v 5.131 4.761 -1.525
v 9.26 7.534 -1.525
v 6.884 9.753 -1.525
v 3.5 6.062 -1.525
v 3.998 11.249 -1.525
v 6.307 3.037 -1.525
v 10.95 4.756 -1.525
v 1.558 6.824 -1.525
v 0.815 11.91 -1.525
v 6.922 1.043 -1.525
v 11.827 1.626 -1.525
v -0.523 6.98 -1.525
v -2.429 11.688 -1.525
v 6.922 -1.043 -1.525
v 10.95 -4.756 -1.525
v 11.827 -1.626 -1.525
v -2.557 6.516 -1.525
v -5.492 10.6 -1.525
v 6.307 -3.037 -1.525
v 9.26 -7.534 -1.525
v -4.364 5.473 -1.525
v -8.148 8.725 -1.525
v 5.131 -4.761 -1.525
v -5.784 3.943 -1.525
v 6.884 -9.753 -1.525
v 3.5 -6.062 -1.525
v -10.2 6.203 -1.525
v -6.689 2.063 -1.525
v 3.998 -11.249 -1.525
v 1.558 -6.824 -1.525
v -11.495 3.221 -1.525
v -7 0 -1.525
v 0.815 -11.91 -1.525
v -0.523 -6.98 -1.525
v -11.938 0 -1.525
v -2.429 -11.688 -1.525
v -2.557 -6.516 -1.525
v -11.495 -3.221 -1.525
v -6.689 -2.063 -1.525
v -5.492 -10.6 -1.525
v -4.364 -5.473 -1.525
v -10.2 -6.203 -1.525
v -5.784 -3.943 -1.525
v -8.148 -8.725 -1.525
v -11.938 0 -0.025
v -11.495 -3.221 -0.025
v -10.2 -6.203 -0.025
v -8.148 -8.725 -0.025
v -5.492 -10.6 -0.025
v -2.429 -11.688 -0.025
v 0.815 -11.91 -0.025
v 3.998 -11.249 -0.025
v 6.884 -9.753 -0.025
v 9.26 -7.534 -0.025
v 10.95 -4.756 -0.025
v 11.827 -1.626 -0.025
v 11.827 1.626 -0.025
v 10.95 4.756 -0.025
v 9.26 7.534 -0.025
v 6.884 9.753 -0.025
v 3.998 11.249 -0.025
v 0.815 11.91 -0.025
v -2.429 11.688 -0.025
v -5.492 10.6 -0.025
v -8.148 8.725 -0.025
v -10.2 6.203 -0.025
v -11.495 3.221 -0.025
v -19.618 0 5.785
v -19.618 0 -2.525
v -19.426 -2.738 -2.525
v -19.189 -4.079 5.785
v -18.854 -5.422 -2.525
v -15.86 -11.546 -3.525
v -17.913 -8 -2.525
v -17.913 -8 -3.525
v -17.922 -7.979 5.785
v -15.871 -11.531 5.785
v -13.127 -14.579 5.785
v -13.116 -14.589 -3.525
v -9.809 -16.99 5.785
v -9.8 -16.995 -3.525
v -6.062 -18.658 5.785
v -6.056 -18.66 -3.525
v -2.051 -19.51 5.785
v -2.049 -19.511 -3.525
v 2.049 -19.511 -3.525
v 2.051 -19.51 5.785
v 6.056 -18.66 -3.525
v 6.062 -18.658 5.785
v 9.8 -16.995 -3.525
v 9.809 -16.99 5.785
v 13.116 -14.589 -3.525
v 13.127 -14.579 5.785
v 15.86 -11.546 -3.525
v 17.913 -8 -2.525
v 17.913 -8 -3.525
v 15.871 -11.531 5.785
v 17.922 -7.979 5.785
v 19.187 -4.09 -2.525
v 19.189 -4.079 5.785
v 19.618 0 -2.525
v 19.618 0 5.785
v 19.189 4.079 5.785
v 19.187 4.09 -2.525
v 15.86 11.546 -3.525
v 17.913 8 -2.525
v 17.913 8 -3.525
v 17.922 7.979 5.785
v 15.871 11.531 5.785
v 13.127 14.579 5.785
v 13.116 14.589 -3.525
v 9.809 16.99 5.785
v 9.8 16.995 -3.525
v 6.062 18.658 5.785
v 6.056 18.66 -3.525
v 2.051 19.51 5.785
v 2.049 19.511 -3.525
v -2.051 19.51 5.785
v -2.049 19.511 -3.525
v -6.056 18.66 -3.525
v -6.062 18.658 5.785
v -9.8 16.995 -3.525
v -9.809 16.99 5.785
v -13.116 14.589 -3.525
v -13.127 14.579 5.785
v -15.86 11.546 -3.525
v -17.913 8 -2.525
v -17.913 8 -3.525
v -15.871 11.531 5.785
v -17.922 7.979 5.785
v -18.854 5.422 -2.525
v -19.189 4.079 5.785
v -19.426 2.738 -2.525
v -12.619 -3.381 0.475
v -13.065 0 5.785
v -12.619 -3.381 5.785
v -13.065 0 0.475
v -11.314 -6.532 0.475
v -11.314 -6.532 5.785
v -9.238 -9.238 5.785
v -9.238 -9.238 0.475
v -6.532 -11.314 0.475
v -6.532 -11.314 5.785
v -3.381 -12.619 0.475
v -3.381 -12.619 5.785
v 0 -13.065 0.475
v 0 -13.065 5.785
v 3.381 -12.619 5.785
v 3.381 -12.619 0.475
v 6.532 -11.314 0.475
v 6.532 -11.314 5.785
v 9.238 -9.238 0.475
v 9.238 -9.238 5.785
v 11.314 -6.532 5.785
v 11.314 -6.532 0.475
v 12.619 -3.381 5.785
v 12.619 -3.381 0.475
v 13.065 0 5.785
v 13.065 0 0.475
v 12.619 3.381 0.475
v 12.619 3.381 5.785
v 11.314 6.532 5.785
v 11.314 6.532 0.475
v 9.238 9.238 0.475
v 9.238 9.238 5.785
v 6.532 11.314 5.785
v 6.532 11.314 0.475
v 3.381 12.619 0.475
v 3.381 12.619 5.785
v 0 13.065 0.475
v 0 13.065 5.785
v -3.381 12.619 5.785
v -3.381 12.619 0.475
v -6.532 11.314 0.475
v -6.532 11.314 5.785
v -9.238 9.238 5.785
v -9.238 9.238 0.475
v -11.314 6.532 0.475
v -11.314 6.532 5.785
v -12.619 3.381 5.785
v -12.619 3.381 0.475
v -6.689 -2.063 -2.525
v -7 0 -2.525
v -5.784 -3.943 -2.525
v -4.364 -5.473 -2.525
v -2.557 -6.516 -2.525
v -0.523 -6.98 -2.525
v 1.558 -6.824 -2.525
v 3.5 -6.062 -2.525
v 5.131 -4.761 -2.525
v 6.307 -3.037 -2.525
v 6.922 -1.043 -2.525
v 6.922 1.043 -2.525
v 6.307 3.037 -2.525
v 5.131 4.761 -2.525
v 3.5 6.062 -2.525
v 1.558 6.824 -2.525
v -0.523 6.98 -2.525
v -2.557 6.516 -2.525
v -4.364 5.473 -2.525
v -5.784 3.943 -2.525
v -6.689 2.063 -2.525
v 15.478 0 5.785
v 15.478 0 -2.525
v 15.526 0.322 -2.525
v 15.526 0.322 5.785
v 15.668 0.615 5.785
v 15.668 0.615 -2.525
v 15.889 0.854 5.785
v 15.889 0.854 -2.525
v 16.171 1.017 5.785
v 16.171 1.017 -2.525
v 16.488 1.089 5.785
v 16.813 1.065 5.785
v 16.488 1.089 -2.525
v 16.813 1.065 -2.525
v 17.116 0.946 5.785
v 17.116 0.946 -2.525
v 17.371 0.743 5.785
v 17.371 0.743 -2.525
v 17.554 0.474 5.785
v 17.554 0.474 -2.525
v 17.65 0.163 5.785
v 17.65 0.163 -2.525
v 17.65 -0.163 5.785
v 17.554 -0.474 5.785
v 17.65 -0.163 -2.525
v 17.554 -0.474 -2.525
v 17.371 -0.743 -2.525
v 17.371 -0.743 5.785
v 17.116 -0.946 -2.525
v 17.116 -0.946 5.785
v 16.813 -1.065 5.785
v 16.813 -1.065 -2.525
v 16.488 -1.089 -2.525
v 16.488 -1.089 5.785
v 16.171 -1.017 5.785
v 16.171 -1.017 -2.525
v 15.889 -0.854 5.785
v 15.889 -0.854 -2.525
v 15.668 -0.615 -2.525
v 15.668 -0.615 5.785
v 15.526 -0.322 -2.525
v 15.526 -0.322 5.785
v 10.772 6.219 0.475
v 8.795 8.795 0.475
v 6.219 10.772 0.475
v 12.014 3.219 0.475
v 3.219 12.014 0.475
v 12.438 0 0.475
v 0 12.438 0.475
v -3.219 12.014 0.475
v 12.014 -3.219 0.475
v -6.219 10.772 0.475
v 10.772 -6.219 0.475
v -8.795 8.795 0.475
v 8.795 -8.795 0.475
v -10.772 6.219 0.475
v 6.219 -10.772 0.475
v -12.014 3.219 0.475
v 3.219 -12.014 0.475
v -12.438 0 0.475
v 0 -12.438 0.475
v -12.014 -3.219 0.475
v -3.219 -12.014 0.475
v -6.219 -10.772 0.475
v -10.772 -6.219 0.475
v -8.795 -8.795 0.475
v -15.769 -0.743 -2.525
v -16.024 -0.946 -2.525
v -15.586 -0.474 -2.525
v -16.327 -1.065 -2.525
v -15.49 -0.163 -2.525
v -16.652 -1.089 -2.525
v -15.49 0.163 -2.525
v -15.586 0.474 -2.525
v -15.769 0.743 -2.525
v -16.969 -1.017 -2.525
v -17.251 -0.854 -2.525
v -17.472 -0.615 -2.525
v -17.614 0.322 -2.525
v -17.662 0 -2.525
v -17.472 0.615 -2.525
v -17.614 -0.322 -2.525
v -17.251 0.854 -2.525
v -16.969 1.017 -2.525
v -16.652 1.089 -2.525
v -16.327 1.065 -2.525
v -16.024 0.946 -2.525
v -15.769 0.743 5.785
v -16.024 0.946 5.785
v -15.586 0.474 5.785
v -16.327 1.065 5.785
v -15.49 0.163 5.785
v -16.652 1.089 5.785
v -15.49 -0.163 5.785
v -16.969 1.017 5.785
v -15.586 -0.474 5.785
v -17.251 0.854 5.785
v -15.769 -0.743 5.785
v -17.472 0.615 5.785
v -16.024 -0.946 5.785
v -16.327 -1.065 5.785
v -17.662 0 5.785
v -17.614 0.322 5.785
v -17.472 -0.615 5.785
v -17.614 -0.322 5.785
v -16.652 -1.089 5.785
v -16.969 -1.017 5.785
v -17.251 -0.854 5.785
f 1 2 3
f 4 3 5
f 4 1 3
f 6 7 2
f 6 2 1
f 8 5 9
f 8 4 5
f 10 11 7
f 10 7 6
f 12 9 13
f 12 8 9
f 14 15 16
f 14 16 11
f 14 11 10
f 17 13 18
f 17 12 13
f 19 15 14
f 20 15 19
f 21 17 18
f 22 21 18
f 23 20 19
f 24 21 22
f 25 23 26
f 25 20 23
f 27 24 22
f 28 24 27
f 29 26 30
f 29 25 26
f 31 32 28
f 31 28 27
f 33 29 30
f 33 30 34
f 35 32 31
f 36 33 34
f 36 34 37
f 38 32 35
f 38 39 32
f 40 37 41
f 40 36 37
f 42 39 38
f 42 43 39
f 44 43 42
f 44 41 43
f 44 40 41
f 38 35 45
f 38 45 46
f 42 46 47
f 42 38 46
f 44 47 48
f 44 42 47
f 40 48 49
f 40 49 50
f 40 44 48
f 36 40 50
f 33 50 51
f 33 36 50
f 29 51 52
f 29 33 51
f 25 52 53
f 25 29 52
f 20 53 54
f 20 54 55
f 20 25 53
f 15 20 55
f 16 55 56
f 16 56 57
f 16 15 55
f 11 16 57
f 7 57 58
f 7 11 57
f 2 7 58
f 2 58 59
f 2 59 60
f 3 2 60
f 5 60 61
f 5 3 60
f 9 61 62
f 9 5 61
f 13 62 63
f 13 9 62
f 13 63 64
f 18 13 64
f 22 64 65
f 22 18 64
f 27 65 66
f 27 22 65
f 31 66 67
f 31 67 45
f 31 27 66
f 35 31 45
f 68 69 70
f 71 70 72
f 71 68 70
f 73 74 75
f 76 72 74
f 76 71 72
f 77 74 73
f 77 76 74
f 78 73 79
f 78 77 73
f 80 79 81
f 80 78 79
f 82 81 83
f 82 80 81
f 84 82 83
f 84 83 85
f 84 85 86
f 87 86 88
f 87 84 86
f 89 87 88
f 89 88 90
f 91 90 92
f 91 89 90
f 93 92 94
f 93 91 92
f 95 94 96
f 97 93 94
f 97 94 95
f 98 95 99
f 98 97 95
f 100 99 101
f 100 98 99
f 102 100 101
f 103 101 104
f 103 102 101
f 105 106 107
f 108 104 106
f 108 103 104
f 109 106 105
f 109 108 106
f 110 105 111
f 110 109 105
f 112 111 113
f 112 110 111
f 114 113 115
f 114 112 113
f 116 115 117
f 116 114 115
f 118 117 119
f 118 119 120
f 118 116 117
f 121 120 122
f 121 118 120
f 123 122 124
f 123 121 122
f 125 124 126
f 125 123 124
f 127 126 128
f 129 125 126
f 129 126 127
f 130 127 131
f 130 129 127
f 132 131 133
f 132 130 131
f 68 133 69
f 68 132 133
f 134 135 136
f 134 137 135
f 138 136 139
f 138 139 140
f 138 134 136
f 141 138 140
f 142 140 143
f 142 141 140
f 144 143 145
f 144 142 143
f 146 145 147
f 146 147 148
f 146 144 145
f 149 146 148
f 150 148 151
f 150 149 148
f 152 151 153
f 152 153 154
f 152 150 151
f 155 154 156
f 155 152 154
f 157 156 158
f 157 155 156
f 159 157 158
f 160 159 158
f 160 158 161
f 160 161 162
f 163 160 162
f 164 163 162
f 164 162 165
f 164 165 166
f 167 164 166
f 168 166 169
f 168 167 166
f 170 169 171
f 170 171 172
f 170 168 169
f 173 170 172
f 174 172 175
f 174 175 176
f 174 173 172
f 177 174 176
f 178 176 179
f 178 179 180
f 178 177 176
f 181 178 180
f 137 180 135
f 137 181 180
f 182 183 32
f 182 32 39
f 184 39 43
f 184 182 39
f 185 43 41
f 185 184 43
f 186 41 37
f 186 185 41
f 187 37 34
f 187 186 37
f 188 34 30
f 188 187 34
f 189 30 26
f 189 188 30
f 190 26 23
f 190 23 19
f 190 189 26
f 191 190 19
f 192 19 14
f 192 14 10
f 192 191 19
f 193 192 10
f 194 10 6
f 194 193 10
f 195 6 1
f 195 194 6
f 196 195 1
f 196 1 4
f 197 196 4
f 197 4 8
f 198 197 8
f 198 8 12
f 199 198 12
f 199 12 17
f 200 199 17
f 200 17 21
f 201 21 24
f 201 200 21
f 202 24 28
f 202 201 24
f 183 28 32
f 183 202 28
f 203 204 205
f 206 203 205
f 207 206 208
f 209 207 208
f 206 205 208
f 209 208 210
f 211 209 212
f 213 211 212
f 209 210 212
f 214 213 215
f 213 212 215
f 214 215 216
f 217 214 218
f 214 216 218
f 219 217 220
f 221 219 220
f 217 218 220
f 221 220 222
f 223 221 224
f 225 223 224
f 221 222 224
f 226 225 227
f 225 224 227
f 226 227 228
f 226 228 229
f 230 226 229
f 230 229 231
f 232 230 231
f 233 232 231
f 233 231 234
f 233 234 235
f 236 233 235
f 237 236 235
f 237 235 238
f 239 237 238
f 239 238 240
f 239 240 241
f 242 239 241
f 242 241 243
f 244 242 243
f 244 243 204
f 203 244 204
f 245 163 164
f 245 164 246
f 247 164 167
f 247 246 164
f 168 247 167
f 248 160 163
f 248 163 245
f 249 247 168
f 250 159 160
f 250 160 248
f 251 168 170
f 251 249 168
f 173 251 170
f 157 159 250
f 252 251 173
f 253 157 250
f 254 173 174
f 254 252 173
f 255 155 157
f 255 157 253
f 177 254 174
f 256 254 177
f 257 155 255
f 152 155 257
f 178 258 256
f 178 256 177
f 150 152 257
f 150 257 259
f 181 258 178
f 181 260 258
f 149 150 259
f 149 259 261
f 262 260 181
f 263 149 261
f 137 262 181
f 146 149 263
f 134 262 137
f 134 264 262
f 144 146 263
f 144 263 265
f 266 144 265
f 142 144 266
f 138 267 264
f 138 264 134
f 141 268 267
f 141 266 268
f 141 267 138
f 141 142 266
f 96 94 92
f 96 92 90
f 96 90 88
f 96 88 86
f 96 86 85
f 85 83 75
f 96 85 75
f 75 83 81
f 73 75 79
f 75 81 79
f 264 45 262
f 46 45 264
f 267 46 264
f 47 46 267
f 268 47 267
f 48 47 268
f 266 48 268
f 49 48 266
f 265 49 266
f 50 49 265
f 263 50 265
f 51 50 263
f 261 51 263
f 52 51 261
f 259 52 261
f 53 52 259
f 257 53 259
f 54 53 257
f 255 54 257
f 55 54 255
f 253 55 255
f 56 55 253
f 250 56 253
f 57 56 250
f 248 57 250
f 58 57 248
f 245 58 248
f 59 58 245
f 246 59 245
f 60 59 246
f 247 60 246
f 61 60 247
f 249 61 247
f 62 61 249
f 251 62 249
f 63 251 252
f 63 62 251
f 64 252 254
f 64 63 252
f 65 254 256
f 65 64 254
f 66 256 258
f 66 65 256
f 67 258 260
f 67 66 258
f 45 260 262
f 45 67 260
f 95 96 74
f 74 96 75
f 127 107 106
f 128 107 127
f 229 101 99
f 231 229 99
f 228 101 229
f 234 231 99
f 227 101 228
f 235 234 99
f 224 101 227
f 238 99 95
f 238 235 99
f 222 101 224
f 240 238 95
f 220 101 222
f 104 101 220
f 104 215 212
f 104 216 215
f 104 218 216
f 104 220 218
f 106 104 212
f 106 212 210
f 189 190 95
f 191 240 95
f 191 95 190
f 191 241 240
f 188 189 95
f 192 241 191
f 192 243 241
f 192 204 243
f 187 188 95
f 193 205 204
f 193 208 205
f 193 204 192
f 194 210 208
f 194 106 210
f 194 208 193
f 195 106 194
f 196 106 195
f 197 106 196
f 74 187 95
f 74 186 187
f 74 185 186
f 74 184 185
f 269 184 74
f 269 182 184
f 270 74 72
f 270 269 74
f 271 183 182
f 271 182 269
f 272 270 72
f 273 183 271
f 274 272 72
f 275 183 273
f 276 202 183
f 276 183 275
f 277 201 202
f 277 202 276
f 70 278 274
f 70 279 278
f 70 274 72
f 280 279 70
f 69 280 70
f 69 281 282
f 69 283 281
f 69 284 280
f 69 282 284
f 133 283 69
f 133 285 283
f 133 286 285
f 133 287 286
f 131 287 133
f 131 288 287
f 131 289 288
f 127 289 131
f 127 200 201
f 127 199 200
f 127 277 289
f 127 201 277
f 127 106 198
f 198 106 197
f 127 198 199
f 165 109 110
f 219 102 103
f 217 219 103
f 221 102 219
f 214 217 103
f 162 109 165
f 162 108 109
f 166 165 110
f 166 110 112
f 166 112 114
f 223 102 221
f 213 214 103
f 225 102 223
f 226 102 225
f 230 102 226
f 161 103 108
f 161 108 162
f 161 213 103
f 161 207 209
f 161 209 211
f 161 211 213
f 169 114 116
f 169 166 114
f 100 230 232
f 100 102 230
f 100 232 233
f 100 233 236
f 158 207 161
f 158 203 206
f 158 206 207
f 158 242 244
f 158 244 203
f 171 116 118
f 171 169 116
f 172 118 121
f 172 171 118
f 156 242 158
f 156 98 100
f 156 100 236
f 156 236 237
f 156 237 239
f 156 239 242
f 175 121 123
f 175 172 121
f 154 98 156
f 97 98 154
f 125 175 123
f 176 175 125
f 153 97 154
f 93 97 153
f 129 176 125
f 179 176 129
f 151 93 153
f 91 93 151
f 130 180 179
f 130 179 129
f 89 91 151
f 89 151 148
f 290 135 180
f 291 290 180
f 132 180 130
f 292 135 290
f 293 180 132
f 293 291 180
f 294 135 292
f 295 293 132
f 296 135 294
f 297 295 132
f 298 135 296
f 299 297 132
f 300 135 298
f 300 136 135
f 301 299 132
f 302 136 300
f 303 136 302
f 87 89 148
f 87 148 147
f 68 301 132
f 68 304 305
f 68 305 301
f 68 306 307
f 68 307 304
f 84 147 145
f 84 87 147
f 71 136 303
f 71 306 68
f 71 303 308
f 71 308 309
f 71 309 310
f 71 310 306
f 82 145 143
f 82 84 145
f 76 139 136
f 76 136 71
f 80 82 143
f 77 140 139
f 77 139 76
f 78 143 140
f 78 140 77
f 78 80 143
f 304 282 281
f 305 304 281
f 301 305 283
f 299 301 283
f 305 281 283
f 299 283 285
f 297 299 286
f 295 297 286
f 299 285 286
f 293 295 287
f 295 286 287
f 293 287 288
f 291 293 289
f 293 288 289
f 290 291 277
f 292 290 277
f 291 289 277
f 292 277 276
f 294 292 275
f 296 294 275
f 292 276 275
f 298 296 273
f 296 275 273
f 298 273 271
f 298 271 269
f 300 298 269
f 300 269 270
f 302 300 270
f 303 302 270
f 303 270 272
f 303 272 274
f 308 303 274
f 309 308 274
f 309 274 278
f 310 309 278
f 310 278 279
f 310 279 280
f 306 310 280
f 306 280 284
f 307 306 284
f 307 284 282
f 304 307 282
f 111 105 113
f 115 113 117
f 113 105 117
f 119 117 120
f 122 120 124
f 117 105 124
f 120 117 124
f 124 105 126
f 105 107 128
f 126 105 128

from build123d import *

# Parameters (mm, degrees)
SKETCH1_W          = 12.617819502
SKETCH1_H          = 2
SKETCH1_W_2        = 6.5532
SKETCH1_H_2        = 5.31
SKETCH2_R          = 1.0922
CUT_EXTRUDE1_DEPTH = 10.31
SKETCH3_W          = 45.123892984
SKETCH3_H          = 16
CUT_EXTRUDE2_DEPTH = 1
CHAMFER1_SIZE      = 0.5


with BuildPart() as part:
    # Sketch1 → Revolve1 (revolve)
    with BuildSketch(Plane(origin=(0, 0, 0), x_dir=(1, 0, 0), z_dir=(0, 1, 0))):
        with Locations((-13.308909751, 2.525473465)):
            Rectangle(SKETCH1_W, SKETCH1_H)
        Polygon((-11.938, 1.525473465), (-19.617819502, 1.525473465), (-19.617819502, -0.474526535), (-13.064619502, -0.474526535), (-11.938, -0.474526535), align=None)
        with Locations((-16.341219502, -3.129526535)):
            Rectangle(SKETCH1_W_2, SKETCH1_H_2)
    revolve(axis=Axis((0, 0, -25.411285606), (0, 0, 1)))

    # Sketch2 → Cut-Extrude1 (cut, through all)
    with BuildSketch(Plane(origin=(0, 0, -3.525473465), x_dir=(-1, 0, 0), z_dir=(0, 0, -1))):
        with Locations((16.57, 0)):
            Circle(SKETCH2_R)
        with Locations((-16.57, 0)):
            Circle(SKETCH2_R)
    extrude(amount=-CUT_EXTRUDE1_DEPTH, mode=Mode.SUBTRACT)

    # Sketch3 → Cut-Extrude2 (cut)
    with BuildSketch(Plane(origin=(0, 0, -3.525473465), x_dir=(-1, 0, 0), z_dir=(0, 0, -1))):
        Rectangle(SKETCH3_W, SKETCH3_H)
    extrude(amount=-CUT_EXTRUDE2_DEPTH, mode=Mode.SUBTRACT)

    # Chamfer1
    chamfer1_edges = [part.edges().sort_by_distance(p)[0] for p in [
        (11.938, 0, 0.474526535),
    ]]
    chamfer(chamfer1_edges, length=CHAMFER1_SIZE)


solid = part.part
